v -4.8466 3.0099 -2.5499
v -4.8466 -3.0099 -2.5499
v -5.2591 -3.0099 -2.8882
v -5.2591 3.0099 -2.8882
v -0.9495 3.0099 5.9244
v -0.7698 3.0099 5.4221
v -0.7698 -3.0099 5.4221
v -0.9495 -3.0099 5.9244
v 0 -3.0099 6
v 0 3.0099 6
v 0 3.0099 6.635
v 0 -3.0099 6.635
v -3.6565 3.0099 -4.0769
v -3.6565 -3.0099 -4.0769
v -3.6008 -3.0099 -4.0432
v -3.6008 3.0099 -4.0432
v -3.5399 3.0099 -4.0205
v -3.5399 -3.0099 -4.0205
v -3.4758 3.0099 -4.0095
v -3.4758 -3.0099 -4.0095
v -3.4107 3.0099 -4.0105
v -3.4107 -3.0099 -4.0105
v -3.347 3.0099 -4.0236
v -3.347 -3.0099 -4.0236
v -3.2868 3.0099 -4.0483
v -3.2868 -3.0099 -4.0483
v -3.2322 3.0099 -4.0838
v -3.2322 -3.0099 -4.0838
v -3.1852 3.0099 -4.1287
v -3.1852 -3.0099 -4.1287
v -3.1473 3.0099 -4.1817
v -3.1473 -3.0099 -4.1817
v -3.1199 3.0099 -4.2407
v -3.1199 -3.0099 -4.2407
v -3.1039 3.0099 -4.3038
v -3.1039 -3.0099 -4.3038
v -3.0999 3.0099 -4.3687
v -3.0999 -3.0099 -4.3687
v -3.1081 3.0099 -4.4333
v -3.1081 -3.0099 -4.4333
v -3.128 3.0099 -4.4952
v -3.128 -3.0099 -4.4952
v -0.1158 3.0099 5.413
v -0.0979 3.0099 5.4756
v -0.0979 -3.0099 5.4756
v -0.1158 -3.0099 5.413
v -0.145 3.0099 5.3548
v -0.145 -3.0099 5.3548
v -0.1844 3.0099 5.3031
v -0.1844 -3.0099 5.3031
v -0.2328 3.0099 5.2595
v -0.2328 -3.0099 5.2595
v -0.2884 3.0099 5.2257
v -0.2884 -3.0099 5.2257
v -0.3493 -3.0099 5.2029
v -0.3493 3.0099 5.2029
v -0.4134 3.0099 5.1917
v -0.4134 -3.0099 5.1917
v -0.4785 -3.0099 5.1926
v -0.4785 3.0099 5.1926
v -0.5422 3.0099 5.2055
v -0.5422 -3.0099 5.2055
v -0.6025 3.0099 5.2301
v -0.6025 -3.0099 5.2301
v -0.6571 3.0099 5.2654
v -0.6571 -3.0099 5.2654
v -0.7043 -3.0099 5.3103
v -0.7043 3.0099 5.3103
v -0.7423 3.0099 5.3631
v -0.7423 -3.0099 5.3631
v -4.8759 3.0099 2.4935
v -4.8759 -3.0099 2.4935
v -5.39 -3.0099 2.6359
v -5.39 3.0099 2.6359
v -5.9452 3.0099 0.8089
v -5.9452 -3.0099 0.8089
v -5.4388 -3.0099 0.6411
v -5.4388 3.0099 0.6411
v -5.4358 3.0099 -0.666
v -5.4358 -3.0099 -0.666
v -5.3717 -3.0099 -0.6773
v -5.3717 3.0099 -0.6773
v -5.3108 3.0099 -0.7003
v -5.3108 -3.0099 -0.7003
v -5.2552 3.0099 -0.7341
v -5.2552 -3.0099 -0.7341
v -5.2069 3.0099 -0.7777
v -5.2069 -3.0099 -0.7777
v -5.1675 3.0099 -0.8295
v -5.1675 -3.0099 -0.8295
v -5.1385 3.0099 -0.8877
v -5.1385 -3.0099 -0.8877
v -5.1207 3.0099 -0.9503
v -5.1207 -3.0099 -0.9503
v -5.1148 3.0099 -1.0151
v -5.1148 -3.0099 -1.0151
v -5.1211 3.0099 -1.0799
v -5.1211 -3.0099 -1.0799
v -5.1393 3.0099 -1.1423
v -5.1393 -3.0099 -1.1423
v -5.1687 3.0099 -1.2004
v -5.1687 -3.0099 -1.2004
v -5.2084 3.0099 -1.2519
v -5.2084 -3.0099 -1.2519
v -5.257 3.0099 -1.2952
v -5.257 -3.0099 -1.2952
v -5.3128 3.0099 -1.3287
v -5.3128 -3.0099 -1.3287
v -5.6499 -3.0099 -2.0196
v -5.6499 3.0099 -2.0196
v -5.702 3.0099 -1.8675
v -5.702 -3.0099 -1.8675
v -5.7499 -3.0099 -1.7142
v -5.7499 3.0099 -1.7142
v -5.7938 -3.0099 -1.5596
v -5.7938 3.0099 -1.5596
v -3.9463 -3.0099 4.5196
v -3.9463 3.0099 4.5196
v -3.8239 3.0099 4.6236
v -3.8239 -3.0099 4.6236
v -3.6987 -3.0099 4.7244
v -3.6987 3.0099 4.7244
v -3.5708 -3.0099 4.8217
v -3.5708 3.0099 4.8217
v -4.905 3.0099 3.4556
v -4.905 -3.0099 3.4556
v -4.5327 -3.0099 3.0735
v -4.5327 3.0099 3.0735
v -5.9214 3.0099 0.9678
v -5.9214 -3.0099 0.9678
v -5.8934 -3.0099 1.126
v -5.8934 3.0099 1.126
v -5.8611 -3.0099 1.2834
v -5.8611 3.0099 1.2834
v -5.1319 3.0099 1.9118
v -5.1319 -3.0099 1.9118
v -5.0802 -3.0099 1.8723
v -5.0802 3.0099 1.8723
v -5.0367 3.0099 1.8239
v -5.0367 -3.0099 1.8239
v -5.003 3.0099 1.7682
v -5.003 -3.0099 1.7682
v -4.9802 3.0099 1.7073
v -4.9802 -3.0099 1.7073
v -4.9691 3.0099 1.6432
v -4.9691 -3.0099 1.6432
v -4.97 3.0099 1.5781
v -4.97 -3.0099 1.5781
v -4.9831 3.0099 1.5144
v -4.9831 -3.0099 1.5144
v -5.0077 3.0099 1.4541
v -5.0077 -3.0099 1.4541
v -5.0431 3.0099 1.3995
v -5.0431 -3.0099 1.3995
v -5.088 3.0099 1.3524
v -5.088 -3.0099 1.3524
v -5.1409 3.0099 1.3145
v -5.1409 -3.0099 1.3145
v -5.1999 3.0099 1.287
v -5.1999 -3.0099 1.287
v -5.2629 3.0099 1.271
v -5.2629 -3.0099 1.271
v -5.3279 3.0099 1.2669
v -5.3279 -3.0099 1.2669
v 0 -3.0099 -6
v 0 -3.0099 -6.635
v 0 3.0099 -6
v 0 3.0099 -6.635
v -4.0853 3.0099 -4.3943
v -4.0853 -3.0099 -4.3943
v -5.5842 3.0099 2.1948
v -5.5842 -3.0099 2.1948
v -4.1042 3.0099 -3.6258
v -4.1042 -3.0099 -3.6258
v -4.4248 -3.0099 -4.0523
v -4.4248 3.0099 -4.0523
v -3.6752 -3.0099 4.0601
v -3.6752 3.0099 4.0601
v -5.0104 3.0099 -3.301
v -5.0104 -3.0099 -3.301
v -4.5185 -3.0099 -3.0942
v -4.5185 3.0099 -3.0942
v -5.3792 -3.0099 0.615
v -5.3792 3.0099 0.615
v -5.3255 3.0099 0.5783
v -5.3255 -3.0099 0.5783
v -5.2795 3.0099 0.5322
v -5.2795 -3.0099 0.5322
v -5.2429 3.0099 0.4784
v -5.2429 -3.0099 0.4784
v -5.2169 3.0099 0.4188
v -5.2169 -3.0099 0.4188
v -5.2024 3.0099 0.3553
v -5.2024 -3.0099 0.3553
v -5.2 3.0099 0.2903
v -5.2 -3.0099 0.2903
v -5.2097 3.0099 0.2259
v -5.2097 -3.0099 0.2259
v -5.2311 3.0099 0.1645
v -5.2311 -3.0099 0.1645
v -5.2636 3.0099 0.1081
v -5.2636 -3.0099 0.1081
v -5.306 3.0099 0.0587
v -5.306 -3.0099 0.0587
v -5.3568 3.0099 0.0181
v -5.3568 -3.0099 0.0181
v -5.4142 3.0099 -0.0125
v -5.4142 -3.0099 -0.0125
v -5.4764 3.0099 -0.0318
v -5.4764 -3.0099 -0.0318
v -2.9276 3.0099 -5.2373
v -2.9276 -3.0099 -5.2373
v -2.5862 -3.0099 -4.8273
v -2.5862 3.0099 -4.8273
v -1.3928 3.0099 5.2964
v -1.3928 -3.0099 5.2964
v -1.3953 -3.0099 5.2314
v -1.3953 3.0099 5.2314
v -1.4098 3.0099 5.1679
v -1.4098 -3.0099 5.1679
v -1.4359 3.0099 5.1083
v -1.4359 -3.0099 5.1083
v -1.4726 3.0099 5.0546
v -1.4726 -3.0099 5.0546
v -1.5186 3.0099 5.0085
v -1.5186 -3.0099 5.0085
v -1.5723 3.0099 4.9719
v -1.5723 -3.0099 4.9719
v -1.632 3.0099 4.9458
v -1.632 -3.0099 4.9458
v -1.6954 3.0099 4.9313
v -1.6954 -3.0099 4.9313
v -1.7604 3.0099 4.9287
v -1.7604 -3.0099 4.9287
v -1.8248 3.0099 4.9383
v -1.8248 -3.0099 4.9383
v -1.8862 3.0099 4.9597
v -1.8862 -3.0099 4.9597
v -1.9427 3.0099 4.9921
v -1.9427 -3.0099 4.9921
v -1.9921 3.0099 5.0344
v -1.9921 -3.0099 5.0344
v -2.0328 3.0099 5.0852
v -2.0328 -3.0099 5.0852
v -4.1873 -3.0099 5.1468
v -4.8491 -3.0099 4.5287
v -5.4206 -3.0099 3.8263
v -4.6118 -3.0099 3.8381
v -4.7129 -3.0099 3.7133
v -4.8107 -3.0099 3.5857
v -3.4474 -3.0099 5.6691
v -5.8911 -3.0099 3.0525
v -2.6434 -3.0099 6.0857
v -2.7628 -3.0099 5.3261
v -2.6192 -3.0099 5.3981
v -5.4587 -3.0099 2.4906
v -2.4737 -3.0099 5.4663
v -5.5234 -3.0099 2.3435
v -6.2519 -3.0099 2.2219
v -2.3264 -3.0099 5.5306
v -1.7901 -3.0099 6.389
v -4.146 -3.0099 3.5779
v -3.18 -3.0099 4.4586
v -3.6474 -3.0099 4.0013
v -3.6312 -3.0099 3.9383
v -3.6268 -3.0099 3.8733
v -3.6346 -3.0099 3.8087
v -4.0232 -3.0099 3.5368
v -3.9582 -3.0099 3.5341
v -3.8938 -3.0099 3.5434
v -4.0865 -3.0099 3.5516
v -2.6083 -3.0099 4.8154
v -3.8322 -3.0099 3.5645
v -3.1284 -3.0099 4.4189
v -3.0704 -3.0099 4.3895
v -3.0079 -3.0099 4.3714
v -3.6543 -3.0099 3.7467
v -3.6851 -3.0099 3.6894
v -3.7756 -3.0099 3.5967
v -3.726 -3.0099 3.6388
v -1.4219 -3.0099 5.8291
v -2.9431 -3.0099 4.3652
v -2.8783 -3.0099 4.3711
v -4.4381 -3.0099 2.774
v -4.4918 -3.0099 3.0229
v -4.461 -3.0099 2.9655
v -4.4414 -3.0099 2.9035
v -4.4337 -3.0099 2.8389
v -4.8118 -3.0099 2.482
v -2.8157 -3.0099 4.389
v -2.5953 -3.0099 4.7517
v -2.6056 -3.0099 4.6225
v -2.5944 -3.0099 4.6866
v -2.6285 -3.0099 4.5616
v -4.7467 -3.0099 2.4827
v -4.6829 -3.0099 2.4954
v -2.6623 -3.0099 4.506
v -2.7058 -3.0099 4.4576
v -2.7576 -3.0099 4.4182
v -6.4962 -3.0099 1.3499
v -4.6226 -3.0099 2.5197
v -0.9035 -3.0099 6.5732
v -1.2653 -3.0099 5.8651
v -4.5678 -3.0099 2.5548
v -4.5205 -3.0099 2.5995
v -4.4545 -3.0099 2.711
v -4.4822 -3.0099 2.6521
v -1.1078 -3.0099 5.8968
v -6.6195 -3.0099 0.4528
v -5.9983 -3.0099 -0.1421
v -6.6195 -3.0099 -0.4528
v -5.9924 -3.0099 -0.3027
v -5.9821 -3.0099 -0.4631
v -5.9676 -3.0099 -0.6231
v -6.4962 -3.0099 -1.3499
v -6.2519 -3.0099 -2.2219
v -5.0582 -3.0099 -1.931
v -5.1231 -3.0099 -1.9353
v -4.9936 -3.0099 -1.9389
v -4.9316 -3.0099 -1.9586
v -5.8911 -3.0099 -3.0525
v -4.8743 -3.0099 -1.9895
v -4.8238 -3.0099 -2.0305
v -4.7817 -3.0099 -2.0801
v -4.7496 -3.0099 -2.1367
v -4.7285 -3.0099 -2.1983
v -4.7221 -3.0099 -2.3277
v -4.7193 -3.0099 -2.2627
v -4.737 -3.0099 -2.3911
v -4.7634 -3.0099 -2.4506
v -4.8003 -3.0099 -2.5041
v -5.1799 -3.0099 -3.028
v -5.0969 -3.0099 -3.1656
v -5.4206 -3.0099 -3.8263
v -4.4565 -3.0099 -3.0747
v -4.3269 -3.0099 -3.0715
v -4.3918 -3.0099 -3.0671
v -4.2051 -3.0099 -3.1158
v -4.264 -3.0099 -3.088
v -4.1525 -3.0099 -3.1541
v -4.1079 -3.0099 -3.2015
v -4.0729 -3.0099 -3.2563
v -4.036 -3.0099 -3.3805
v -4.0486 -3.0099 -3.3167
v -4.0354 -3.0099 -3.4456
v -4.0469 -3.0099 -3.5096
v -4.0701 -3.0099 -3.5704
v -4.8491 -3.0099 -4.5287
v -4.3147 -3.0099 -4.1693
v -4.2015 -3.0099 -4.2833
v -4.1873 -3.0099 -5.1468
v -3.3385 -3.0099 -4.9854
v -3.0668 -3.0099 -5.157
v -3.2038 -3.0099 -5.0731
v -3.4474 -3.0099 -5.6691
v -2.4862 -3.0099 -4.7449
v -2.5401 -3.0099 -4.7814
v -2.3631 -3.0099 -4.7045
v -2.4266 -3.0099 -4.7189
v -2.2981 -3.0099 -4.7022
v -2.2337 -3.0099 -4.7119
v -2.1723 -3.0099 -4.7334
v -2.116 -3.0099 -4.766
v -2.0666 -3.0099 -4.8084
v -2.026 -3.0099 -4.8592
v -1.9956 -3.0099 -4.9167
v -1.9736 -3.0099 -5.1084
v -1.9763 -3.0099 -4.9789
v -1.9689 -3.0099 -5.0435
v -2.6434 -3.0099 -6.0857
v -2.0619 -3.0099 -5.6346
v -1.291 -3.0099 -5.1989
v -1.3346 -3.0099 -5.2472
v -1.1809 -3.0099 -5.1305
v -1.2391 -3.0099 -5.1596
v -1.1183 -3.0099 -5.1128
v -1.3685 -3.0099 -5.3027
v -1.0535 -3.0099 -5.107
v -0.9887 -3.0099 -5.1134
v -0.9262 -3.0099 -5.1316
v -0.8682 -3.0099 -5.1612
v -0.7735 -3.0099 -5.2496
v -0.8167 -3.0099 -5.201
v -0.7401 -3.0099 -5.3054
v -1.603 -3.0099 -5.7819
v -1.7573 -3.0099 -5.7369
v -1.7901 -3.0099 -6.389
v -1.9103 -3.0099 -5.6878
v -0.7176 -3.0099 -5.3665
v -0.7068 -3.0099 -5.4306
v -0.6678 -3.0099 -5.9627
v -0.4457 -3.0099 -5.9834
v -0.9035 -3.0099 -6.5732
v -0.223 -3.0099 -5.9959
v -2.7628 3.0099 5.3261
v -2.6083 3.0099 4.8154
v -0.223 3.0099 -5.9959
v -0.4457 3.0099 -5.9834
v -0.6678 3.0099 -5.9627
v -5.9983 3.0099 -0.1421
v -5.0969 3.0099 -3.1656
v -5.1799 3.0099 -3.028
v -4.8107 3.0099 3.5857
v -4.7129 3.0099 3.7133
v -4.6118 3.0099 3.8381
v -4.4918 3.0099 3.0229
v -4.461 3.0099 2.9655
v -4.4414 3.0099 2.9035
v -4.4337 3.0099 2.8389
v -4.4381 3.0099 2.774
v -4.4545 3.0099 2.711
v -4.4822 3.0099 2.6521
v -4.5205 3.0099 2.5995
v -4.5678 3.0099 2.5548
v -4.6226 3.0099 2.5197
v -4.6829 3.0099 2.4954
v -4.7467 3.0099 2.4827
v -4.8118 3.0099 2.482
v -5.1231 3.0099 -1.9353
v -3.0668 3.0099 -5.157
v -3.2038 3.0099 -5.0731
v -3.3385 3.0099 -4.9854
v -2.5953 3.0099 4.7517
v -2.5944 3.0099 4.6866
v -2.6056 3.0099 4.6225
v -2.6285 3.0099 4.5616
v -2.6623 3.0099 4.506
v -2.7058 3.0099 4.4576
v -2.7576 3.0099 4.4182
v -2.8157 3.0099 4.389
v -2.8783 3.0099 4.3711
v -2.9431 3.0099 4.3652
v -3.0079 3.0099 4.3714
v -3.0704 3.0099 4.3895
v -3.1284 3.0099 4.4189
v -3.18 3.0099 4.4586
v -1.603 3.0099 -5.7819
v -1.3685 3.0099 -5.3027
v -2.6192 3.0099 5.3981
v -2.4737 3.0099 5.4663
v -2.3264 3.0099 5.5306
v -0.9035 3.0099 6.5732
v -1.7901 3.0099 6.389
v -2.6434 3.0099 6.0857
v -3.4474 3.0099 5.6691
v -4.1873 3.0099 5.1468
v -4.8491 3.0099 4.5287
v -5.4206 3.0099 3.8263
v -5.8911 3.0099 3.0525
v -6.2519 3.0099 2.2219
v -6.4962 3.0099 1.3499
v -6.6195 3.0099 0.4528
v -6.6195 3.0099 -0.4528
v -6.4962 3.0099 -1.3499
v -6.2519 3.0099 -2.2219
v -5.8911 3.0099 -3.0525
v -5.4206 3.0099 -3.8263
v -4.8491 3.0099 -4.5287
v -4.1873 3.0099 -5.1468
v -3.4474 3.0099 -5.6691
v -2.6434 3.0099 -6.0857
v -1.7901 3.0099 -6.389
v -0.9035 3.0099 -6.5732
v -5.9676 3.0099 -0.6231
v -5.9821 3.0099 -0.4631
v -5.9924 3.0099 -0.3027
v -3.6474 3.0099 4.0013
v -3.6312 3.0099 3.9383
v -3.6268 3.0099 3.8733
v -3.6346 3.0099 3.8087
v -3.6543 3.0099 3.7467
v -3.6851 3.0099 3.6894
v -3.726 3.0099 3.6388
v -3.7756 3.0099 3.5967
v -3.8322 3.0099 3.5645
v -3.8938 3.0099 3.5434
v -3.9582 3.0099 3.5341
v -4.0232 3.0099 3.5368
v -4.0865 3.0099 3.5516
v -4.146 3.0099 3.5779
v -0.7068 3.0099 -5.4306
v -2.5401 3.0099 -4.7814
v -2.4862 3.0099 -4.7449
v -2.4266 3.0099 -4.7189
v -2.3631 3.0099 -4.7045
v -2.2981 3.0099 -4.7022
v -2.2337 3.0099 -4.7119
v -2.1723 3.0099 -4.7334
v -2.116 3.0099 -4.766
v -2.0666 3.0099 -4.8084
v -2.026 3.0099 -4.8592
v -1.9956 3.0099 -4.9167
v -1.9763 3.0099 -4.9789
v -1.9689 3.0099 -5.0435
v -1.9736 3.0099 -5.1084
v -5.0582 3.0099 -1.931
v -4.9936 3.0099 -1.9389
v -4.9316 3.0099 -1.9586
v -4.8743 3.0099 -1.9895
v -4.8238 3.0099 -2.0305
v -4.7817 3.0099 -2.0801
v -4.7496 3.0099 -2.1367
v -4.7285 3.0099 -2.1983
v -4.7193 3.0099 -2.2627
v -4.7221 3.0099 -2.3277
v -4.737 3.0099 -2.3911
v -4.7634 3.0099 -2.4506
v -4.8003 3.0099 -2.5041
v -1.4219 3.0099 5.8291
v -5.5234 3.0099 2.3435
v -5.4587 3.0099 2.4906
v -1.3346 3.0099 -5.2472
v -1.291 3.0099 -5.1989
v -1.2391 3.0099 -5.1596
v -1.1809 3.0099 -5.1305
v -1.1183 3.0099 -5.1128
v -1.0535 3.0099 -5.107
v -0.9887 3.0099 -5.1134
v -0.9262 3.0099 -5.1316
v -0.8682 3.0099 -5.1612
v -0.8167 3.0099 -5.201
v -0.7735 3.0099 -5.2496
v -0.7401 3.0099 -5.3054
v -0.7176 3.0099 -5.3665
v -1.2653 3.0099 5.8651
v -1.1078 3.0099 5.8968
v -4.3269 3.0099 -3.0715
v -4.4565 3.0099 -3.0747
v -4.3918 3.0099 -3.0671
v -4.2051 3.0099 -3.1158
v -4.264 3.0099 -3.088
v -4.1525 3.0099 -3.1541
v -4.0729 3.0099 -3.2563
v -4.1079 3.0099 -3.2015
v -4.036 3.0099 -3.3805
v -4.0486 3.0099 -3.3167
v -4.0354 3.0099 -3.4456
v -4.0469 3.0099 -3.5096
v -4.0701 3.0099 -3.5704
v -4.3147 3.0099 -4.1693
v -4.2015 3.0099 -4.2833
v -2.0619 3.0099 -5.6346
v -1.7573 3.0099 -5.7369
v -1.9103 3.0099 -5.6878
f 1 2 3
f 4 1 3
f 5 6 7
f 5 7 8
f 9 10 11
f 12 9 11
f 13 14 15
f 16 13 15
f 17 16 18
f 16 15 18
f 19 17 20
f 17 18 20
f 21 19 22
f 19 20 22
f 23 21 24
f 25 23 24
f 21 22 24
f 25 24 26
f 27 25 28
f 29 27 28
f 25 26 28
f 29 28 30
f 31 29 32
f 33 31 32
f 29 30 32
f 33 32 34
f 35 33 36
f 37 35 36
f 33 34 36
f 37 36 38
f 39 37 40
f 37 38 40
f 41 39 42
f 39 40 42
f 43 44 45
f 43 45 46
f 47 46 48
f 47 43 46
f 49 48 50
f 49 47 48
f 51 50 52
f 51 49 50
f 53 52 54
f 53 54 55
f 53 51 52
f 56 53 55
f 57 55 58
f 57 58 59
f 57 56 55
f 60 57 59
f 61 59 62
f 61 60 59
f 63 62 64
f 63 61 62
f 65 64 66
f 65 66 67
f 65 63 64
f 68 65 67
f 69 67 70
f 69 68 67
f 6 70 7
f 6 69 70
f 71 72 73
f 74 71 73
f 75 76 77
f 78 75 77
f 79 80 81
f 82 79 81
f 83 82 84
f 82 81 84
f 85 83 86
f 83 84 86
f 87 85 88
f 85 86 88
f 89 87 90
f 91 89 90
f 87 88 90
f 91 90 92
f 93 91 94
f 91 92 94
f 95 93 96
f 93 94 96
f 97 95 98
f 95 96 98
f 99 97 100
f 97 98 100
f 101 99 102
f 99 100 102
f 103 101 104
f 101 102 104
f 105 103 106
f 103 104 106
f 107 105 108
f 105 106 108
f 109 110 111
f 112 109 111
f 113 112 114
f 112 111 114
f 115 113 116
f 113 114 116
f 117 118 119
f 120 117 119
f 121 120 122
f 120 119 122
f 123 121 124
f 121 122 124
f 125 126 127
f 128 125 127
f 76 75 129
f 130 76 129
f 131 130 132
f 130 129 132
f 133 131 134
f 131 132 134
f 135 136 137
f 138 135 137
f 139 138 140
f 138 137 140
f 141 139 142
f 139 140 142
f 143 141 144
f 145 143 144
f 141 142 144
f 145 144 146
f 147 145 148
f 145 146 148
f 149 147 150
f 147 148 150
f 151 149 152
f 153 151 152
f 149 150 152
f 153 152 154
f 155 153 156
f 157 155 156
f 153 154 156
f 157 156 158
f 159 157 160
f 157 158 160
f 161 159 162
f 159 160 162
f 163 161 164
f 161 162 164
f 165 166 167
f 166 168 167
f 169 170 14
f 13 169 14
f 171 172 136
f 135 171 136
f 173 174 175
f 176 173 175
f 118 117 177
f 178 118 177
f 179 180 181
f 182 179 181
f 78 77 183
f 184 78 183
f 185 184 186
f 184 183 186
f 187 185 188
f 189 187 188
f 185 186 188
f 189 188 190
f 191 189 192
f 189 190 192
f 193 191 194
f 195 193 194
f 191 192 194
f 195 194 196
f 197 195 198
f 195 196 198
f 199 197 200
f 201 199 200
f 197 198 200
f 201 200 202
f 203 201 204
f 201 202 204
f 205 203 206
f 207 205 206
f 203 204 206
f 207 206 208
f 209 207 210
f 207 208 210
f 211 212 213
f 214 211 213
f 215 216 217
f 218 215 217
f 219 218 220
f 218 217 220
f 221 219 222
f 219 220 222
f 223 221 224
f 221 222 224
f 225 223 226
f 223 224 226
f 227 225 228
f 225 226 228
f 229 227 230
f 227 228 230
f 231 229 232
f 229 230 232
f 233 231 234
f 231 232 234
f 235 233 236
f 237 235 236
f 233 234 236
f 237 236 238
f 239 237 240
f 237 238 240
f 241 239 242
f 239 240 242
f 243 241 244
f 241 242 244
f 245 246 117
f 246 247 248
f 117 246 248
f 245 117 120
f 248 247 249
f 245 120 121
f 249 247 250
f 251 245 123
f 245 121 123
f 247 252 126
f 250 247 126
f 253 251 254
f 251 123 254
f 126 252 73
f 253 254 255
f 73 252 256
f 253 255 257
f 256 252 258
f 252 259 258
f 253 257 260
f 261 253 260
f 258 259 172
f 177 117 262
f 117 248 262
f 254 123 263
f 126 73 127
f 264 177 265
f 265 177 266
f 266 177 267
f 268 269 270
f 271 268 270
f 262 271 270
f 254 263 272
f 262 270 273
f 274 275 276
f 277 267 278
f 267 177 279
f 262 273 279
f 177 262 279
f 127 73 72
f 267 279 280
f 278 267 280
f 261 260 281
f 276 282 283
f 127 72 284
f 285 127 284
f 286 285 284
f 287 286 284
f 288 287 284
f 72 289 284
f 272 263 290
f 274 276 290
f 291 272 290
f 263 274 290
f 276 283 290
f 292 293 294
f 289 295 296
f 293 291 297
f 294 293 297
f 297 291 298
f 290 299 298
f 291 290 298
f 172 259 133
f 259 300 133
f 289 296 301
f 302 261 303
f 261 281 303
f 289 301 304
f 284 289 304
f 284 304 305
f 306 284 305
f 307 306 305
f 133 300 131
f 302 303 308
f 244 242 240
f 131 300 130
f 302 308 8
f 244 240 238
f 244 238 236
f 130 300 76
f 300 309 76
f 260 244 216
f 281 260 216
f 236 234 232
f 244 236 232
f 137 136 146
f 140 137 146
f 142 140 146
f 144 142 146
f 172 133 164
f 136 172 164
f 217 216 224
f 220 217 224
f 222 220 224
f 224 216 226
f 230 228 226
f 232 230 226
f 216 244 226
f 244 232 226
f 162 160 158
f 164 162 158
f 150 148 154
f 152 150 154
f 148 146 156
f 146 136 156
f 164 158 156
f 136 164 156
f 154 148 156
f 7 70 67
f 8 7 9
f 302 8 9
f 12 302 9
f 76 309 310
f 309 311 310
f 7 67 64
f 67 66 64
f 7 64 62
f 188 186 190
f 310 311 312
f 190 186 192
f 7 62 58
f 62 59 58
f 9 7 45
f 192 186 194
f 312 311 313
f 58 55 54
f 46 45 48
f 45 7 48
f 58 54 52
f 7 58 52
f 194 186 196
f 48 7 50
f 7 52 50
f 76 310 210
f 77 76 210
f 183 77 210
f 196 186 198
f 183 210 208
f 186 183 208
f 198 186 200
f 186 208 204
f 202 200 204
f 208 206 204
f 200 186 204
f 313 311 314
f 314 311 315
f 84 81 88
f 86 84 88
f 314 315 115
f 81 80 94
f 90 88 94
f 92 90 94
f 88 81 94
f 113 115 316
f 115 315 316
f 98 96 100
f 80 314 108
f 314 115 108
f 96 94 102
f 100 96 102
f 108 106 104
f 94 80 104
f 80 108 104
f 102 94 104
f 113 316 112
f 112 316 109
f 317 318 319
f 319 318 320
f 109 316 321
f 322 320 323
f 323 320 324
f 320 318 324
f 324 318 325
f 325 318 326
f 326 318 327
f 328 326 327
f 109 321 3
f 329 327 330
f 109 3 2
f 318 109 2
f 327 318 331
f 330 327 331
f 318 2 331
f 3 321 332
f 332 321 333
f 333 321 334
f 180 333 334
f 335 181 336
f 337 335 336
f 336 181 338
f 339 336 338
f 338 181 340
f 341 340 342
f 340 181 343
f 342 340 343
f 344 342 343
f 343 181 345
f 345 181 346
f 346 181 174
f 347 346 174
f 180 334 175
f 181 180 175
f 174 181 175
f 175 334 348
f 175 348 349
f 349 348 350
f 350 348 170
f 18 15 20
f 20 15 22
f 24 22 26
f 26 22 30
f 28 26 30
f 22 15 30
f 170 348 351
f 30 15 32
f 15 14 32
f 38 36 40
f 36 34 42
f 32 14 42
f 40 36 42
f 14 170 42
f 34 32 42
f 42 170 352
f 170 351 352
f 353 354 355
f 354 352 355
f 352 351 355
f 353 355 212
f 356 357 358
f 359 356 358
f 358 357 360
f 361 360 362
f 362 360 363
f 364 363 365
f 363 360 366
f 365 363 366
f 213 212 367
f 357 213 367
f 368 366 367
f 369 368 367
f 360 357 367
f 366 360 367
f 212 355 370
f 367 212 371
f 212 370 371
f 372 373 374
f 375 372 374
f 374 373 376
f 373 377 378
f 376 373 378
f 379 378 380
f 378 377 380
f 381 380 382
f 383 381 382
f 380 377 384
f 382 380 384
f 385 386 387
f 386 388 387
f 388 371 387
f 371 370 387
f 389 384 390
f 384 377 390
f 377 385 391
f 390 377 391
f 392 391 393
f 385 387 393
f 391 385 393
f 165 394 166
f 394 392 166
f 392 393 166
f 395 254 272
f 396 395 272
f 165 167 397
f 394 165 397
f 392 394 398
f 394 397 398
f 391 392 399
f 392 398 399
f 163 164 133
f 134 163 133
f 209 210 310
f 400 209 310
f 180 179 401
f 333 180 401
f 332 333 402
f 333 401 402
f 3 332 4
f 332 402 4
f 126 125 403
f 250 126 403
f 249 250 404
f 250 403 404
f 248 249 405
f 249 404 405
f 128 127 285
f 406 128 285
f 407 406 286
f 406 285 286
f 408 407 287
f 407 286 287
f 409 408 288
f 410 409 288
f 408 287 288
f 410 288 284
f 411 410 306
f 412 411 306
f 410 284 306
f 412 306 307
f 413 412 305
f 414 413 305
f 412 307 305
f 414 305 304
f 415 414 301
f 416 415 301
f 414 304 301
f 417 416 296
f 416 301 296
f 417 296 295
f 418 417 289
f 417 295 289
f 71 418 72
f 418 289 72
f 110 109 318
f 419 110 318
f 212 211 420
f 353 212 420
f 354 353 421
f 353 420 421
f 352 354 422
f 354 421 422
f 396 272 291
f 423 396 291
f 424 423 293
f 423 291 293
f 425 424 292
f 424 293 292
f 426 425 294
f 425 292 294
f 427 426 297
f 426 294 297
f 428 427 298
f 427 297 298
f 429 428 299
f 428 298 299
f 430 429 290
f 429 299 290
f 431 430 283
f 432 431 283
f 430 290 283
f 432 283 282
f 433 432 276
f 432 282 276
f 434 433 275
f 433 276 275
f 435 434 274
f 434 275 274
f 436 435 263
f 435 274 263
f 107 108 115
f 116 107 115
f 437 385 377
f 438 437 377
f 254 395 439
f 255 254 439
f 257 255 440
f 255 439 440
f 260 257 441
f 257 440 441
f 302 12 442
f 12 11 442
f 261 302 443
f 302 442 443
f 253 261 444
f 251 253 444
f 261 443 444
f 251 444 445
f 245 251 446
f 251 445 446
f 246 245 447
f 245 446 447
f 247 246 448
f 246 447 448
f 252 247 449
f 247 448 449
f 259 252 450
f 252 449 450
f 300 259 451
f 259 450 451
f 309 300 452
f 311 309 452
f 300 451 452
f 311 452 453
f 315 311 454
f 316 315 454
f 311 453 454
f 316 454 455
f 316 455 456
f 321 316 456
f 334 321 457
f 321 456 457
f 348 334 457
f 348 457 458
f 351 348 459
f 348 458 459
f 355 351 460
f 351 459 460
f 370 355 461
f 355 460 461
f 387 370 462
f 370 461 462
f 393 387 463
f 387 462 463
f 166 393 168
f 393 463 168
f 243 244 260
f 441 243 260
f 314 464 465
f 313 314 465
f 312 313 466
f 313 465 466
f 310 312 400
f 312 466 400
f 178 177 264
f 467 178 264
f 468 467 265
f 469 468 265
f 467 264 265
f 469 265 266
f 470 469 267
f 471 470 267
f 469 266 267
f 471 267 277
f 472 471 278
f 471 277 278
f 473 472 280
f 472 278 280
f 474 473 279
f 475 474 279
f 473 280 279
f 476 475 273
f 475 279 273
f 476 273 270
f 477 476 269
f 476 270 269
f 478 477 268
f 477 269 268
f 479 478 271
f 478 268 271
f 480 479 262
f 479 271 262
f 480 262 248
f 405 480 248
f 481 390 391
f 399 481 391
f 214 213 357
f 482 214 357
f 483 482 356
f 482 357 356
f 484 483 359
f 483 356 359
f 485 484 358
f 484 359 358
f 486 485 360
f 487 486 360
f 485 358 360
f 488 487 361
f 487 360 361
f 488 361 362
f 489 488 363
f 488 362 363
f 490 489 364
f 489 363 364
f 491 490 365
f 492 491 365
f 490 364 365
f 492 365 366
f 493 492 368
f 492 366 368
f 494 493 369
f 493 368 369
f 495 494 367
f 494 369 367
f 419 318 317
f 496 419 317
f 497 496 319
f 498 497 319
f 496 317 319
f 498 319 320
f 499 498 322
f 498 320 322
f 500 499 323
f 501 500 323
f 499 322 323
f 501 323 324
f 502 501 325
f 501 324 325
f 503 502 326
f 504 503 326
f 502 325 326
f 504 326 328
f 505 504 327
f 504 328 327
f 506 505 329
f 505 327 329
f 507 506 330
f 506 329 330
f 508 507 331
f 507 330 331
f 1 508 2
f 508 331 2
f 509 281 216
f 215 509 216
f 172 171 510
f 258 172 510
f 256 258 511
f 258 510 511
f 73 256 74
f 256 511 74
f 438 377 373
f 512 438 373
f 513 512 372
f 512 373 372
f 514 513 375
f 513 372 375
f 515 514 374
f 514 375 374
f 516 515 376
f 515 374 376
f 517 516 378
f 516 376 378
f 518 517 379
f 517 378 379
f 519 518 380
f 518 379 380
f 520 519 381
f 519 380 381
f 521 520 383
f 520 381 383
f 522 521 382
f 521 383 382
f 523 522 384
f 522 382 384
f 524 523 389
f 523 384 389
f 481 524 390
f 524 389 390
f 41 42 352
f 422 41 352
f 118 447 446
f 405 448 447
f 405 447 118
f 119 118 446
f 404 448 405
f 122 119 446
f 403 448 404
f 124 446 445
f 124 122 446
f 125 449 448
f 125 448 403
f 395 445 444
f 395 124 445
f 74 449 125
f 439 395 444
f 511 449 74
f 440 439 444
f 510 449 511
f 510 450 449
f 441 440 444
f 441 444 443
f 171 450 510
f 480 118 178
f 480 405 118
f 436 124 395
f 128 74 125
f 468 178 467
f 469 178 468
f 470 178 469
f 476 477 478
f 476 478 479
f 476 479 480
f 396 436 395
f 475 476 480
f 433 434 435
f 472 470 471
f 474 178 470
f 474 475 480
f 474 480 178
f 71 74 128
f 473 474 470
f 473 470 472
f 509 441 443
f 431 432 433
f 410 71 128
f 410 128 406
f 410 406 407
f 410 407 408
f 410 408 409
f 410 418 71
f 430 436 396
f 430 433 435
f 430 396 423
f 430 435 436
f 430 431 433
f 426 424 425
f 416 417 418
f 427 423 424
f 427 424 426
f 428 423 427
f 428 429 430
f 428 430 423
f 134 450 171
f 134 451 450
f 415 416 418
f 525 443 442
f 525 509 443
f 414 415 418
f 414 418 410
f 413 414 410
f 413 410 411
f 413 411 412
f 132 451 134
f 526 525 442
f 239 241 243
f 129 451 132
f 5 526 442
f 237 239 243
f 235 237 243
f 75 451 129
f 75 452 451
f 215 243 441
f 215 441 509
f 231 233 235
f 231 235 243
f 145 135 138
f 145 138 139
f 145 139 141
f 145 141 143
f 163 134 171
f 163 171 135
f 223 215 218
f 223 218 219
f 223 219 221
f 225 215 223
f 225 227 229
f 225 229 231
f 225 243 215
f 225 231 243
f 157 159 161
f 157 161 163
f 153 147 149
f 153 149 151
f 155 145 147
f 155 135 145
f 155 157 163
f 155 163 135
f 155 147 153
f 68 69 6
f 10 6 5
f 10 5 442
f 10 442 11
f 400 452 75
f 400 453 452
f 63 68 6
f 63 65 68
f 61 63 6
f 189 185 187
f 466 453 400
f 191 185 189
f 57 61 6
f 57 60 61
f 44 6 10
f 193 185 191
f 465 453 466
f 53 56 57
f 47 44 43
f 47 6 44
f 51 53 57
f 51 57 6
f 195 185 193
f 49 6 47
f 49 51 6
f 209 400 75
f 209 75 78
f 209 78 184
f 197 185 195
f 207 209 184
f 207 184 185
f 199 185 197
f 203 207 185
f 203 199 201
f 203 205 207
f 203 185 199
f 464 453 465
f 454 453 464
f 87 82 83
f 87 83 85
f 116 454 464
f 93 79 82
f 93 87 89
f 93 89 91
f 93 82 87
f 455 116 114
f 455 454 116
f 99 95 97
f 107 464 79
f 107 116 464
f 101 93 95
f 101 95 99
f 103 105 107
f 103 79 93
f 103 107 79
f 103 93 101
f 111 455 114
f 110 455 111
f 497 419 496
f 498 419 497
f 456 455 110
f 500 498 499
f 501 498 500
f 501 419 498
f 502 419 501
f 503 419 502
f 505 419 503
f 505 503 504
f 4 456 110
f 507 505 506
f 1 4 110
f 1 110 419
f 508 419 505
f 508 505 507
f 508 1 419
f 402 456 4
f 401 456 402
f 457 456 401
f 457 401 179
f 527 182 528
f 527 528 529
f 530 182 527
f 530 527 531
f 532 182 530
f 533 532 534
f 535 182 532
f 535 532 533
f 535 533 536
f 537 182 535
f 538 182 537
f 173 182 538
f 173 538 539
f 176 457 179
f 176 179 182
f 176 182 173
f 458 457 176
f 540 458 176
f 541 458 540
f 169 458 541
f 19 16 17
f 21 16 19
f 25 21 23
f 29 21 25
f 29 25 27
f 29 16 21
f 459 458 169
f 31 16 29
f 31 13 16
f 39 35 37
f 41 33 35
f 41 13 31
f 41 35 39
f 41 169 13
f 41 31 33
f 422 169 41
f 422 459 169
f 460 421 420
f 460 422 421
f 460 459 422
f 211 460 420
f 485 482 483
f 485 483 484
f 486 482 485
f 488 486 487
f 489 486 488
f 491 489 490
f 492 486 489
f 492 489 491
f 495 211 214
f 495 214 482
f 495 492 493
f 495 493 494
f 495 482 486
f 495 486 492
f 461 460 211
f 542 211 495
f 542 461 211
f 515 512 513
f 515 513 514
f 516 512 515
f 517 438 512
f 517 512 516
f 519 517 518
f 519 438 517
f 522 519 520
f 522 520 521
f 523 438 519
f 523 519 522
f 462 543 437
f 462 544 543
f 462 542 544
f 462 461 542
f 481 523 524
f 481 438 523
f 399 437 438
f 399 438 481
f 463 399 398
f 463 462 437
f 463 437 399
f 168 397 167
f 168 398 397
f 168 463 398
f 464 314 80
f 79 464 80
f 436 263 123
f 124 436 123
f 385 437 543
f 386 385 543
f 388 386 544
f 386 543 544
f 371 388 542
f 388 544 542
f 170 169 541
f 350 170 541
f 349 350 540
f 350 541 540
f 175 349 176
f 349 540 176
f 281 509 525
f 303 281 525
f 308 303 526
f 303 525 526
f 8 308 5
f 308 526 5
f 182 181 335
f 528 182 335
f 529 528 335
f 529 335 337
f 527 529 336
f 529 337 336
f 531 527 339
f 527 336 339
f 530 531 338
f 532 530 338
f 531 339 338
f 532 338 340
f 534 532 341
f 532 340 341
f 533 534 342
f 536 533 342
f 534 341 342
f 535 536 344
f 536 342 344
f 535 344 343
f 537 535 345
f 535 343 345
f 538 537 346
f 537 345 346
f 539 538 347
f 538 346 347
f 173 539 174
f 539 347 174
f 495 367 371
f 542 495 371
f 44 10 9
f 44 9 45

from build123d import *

# Parameters (mm, degrees)
BOSS_EXTRUDE1_DEPTH = 3.0099
BOSS_EXTRUDE2_DEPTH = 6.0198
CRVPATTERN1_START   = -3.0099
CRVPATTERN1_DEPTH   = 6.0198


# Read off the part's stored shape, not the designer's step: CrvPattern1
with BuildPart() as part:
    # Sketch1 → Boss-Extrude1 (new, symmetric)
    with BuildSketch(Plane(origin=(0, 0, 0), x_dir=(1, 0, 0), z_dir=(0, 1, 0))):
        with BuildLine():
            Line((0, -6), (0, -6.635))
            ThreePointArc((0, -6.635), (-6.635, 0), (0, 6.635))
            Line((0, 6.635), (0, 6))
            ThreePointArc((0, 6), (-6, 0), (0, -6))
        make_face()
    extrude(amount=BOSS_EXTRUDE1_DEPTH, both=True)

    # Sketch2 → Boss-Extrude2 (add)
    with BuildSketch(Plane(origin=(0, 3.0099, 0), x_dir=(1, 0, 0), z_dir=(0, 1, 0))):
        with BuildLine():
            Line((0, -6), (-0.097943085, -5.475567721))
            ThreePointArc((-0.097943085, -5.475567721), (-0.413392769, -5.191665428), (-0.769794827, -5.422070697))
            Line((-0.769794827, -5.422070697), (-0.949494698, -5.924395312))
            ThreePointArc((-0.949494698, -5.924395312), (-0.47625, -5.981068963), (0, -6))
        make_face()
    extrude(amount=-BOSS_EXTRUDE2_DEPTH)

    # CrvPattern1 outline → CrvPattern1 (add)
    with BuildSketch(Plane(origin=(0, 0, 0), x_dir=(1, 0, 0), z_dir=(0, 1, 0)).offset(CRVPATTERN1_START)):
        with BuildLine():
            ThreePointArc((-1.392781631, -5.296375557), (-1.631964533, -4.945803803), (-2.0328165, -5.085183555))
            Line((-2.0328165, -5.085183555), (-2.326440816, -5.530612365))
            ThreePointArc((-2.326440816, -5.530612365), (-1.880108137, -5.697823566), (-1.421911325, -5.829079531))
            Line((-1.421911325, -5.829079531), (-1.392781631, -5.296375557))
        make_face()
        with BuildLine():
            ThreePointArc((-0.667838723, 5.962716784), (-1.139022221, 5.890893683), (-1.603018095, 5.781897006))
            Line((-1.603018095, 5.781897006), (-1.368522884, 5.302695525))
            ThreePointArc((-1.368522884, 5.302695525), (-0.988689868, 5.113391814), (-0.706800505, 5.430641561))
            Line((-0.706800505, 5.430641561), (-0.667838723, 5.962716784))
        make_face()
        with BuildLine():
            ThreePointArc((-2.061889926, 5.634590485), (-2.502629927, 5.453149865), (-2.927577467, 5.237297984))
            Line((-2.927577467, 5.237297984), (-2.586198593, 4.827319293))
            ThreePointArc((-2.586198593, 4.827319293), (-2.172323601, 4.733423039), (-1.97364785, 5.108438987))
            Line((-1.97364785, 5.108438987), (-2.061889926, 5.634590485))
        make_face()
        with BuildLine():
            ThreePointArc((-3.338468064, 4.985441905), (-3.723654071, 4.704721071), (-4.085342534, 4.394311821))
            Line((-4.085342534, 4.394311821), (-3.656529542, 4.076913836))
            ThreePointArc((-3.656529542, 4.076913836), (-3.232192478, 4.083774637), (-3.128049589, 4.495190818))
            Line((-3.128049589, 4.495190818), (-3.338468064, 4.985441905))
        make_face()
        with BuildLine():
            ThreePointArc((-4.424842028, 4.052255302), (-4.732528651, 3.6882479), (-5.010351382, 3.300966378))
            Line((-5.010351382, 3.300966378), (-4.518535244, 3.09423237))
            ThreePointArc((-4.518535244, 3.09423237), (-4.10791207, 3.201459343), (-4.104235427, 3.625835941))
            Line((-4.104235427, 3.625835941), (-4.424842028, 4.052255302))
        make_face()
        with BuildLine():
            ThreePointArc((-5.2591173, 2.888197574), (-5.471774558, 2.461642376), (-5.649903027, 2.019553363))
            Line((-5.649903027, 2.019553363), (-5.123104226, 1.93526169))
            ThreePointArc((-5.123104226, 1.93526169), (-4.749589577, 2.136745739), (-4.846588652, 2.549904539))
            Line((-4.846588652, 2.549904539), (-5.2591173, 2.888197574))
        make_face()
        with BuildLine():
            ThreePointArc((-5.793762308, 1.559589152), (-5.899274375, 1.094788495), (-5.967559981, 0.623079345))
            Line((-5.967559981, 0.623079345), (-5.435792082, 0.666032397))
            ThreePointArc((-5.435792082, 0.666032397), (-5.120666391, 0.950294273), (-5.312814808, 1.328696177))
            Line((-5.312814808, 1.328696177), (-5.793762308, 1.559589152))
        make_face()
        with BuildLine():
            ThreePointArc((-5.998316459, 0.142125493), (-5.990671945, -0.334439306), (-5.945224219, -0.808893678))
            Line((-5.945224219, -0.808893678), (-5.438783895, -0.641143085))
            ThreePointArc((-5.438783895, -0.641143085), (-5.200000973, -0.290298773), (-5.476351366, 0.031787357))
            Line((-5.476351366, 0.031787357), (-5.998316459, 0.142125493))
        make_face()
        with BuildLine():
            ThreePointArc((-5.861125591, -1.28343555), (-5.740760029, -1.744612933), (-5.584168287, -2.194781205))
            Line((-5.584168287, -2.194781205), (-5.131909211, -1.911790408))
            ThreePointArc((-5.131909211, -1.911790408), (-4.983073354, -1.514352485), (-5.327881076, -1.266932499))
            Line((-5.327881076, -1.266932499), (-5.861125591, -1.28343555))
        make_face()
        with BuildLine():
            ThreePointArc((-5.390005944, -2.635874792), (-5.163776982, -3.055389873), (-4.904962802, -3.455624388))
            Line((-4.904962802, -3.455624388), (-4.532651751, -3.073516361))
            ThreePointArc((-4.532651751, -3.073516361), (-4.482242656, -2.652128252), (-4.875862809, -2.49347079))
            Line((-4.875862809, -2.49347079), (-5.390005944, -2.635874792))
        make_face()
        with BuildLine():
            ThreePointArc((-4.611798851, -3.838139049), (-4.292595541, -4.19209059), (-3.94630447, -4.519588591))
            Line((-3.94630447, -4.519588591), (-3.675153304, -4.060133361))
            ThreePointArc((-3.675153304, -4.060133361), (-3.726042954, -3.638803018), (-4.146049624, -3.577947349))
            Line((-4.146049624, -3.577947349), (-4.611798851, -3.838139049))
        make_face()
        with BuildLine():
            ThreePointArc((-3.570841484, -4.821731131), (-3.176849953, -5.089953278), (-2.762811401, -5.326056061))
            Line((-2.762811401, -5.326056061), (-2.608268548, -4.815430396))
            ThreePointArc((-2.608268548, -4.815430396), (-2.757557583, -4.418162477), (-3.180021524, -4.458575762))
            Line((-3.180021524, -4.458575762), (-3.570841484, -4.821731131))
        make_face()
    extrude(amount=CRVPATTERN1_DEPTH)


solid = part.part
